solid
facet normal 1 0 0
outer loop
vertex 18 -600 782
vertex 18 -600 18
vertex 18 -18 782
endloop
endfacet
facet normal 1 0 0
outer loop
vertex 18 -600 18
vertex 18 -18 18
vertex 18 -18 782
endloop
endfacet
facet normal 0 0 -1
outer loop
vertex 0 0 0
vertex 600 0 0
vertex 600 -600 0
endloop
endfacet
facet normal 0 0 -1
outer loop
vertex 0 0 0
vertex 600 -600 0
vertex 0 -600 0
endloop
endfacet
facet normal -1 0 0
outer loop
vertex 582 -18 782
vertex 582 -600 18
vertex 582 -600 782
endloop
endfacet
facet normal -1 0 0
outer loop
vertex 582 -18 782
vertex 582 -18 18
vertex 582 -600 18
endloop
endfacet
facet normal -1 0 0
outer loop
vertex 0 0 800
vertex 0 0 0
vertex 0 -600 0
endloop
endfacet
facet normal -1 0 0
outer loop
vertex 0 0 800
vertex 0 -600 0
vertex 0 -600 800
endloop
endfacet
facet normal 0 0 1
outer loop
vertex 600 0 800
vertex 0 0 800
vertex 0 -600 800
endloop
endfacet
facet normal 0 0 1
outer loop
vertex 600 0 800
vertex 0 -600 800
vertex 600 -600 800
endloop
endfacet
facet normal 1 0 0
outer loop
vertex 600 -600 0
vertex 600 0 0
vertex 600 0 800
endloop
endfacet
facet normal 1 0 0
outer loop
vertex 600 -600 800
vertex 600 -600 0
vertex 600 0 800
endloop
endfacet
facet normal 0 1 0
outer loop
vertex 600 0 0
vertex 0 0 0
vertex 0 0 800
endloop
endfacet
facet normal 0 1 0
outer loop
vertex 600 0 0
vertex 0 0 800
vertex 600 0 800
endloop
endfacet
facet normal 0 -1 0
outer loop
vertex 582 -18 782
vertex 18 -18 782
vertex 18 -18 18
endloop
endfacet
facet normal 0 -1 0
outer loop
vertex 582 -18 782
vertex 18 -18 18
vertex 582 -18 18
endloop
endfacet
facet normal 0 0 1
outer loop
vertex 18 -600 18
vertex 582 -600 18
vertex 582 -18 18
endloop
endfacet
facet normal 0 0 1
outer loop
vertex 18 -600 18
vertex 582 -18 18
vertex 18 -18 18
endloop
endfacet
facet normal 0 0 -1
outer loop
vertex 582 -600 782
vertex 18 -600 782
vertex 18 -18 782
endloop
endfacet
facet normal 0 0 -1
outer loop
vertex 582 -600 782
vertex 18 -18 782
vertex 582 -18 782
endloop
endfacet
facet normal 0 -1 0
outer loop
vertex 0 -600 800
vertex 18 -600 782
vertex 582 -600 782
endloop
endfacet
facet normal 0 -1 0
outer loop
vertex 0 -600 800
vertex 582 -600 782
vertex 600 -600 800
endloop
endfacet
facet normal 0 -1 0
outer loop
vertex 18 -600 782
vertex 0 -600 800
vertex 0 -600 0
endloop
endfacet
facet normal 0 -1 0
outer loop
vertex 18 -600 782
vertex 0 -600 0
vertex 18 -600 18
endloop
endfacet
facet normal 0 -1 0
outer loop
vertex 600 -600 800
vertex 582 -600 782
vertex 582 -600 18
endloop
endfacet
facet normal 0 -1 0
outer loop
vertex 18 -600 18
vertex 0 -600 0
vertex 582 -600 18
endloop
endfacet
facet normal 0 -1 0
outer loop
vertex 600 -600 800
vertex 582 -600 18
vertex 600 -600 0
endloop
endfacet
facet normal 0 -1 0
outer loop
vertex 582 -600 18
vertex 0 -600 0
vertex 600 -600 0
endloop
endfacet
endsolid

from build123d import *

# Parameters (mm, degrees)
F0_W     = 50.6739839911
F0_H     = 37.3927876353
F1_DEPTH = 800
F2_DEPTH = 600
F3_DEPTH = 600
F4_T     = -18


with BuildPart() as f1:
    # F0 (on Top) → F1 (new body)
    with BuildSketch(Plane.XY):
        with Locations((25.3369919956, -18.6963938177)):
            Rectangle(F0_W, F0_H)
    extrude(amount=F1_DEPTH)

    # F2 (add): a face of the model
    f2_faces = [f1.faces().sort_by_distance(p)[0] for p in [
        (0, -18.6963938177, 400),
    ]]
    extrude(f2_faces, amount=-F2_DEPTH)

    # F3 (add): a face of the model
    f3_faces = [f1.faces().sort_by_distance(p)[0] for p in [
        (300, 0, 400),
    ]]
    extrude(f3_faces, amount=-F3_DEPTH)

    # F4
    f4_openings = [f1.faces().sort_by_distance(p)[0] for p in [
        (300, -600, 400),
    ]]
    offset(amount=F4_T, openings=f4_openings)


solid = f1.part
